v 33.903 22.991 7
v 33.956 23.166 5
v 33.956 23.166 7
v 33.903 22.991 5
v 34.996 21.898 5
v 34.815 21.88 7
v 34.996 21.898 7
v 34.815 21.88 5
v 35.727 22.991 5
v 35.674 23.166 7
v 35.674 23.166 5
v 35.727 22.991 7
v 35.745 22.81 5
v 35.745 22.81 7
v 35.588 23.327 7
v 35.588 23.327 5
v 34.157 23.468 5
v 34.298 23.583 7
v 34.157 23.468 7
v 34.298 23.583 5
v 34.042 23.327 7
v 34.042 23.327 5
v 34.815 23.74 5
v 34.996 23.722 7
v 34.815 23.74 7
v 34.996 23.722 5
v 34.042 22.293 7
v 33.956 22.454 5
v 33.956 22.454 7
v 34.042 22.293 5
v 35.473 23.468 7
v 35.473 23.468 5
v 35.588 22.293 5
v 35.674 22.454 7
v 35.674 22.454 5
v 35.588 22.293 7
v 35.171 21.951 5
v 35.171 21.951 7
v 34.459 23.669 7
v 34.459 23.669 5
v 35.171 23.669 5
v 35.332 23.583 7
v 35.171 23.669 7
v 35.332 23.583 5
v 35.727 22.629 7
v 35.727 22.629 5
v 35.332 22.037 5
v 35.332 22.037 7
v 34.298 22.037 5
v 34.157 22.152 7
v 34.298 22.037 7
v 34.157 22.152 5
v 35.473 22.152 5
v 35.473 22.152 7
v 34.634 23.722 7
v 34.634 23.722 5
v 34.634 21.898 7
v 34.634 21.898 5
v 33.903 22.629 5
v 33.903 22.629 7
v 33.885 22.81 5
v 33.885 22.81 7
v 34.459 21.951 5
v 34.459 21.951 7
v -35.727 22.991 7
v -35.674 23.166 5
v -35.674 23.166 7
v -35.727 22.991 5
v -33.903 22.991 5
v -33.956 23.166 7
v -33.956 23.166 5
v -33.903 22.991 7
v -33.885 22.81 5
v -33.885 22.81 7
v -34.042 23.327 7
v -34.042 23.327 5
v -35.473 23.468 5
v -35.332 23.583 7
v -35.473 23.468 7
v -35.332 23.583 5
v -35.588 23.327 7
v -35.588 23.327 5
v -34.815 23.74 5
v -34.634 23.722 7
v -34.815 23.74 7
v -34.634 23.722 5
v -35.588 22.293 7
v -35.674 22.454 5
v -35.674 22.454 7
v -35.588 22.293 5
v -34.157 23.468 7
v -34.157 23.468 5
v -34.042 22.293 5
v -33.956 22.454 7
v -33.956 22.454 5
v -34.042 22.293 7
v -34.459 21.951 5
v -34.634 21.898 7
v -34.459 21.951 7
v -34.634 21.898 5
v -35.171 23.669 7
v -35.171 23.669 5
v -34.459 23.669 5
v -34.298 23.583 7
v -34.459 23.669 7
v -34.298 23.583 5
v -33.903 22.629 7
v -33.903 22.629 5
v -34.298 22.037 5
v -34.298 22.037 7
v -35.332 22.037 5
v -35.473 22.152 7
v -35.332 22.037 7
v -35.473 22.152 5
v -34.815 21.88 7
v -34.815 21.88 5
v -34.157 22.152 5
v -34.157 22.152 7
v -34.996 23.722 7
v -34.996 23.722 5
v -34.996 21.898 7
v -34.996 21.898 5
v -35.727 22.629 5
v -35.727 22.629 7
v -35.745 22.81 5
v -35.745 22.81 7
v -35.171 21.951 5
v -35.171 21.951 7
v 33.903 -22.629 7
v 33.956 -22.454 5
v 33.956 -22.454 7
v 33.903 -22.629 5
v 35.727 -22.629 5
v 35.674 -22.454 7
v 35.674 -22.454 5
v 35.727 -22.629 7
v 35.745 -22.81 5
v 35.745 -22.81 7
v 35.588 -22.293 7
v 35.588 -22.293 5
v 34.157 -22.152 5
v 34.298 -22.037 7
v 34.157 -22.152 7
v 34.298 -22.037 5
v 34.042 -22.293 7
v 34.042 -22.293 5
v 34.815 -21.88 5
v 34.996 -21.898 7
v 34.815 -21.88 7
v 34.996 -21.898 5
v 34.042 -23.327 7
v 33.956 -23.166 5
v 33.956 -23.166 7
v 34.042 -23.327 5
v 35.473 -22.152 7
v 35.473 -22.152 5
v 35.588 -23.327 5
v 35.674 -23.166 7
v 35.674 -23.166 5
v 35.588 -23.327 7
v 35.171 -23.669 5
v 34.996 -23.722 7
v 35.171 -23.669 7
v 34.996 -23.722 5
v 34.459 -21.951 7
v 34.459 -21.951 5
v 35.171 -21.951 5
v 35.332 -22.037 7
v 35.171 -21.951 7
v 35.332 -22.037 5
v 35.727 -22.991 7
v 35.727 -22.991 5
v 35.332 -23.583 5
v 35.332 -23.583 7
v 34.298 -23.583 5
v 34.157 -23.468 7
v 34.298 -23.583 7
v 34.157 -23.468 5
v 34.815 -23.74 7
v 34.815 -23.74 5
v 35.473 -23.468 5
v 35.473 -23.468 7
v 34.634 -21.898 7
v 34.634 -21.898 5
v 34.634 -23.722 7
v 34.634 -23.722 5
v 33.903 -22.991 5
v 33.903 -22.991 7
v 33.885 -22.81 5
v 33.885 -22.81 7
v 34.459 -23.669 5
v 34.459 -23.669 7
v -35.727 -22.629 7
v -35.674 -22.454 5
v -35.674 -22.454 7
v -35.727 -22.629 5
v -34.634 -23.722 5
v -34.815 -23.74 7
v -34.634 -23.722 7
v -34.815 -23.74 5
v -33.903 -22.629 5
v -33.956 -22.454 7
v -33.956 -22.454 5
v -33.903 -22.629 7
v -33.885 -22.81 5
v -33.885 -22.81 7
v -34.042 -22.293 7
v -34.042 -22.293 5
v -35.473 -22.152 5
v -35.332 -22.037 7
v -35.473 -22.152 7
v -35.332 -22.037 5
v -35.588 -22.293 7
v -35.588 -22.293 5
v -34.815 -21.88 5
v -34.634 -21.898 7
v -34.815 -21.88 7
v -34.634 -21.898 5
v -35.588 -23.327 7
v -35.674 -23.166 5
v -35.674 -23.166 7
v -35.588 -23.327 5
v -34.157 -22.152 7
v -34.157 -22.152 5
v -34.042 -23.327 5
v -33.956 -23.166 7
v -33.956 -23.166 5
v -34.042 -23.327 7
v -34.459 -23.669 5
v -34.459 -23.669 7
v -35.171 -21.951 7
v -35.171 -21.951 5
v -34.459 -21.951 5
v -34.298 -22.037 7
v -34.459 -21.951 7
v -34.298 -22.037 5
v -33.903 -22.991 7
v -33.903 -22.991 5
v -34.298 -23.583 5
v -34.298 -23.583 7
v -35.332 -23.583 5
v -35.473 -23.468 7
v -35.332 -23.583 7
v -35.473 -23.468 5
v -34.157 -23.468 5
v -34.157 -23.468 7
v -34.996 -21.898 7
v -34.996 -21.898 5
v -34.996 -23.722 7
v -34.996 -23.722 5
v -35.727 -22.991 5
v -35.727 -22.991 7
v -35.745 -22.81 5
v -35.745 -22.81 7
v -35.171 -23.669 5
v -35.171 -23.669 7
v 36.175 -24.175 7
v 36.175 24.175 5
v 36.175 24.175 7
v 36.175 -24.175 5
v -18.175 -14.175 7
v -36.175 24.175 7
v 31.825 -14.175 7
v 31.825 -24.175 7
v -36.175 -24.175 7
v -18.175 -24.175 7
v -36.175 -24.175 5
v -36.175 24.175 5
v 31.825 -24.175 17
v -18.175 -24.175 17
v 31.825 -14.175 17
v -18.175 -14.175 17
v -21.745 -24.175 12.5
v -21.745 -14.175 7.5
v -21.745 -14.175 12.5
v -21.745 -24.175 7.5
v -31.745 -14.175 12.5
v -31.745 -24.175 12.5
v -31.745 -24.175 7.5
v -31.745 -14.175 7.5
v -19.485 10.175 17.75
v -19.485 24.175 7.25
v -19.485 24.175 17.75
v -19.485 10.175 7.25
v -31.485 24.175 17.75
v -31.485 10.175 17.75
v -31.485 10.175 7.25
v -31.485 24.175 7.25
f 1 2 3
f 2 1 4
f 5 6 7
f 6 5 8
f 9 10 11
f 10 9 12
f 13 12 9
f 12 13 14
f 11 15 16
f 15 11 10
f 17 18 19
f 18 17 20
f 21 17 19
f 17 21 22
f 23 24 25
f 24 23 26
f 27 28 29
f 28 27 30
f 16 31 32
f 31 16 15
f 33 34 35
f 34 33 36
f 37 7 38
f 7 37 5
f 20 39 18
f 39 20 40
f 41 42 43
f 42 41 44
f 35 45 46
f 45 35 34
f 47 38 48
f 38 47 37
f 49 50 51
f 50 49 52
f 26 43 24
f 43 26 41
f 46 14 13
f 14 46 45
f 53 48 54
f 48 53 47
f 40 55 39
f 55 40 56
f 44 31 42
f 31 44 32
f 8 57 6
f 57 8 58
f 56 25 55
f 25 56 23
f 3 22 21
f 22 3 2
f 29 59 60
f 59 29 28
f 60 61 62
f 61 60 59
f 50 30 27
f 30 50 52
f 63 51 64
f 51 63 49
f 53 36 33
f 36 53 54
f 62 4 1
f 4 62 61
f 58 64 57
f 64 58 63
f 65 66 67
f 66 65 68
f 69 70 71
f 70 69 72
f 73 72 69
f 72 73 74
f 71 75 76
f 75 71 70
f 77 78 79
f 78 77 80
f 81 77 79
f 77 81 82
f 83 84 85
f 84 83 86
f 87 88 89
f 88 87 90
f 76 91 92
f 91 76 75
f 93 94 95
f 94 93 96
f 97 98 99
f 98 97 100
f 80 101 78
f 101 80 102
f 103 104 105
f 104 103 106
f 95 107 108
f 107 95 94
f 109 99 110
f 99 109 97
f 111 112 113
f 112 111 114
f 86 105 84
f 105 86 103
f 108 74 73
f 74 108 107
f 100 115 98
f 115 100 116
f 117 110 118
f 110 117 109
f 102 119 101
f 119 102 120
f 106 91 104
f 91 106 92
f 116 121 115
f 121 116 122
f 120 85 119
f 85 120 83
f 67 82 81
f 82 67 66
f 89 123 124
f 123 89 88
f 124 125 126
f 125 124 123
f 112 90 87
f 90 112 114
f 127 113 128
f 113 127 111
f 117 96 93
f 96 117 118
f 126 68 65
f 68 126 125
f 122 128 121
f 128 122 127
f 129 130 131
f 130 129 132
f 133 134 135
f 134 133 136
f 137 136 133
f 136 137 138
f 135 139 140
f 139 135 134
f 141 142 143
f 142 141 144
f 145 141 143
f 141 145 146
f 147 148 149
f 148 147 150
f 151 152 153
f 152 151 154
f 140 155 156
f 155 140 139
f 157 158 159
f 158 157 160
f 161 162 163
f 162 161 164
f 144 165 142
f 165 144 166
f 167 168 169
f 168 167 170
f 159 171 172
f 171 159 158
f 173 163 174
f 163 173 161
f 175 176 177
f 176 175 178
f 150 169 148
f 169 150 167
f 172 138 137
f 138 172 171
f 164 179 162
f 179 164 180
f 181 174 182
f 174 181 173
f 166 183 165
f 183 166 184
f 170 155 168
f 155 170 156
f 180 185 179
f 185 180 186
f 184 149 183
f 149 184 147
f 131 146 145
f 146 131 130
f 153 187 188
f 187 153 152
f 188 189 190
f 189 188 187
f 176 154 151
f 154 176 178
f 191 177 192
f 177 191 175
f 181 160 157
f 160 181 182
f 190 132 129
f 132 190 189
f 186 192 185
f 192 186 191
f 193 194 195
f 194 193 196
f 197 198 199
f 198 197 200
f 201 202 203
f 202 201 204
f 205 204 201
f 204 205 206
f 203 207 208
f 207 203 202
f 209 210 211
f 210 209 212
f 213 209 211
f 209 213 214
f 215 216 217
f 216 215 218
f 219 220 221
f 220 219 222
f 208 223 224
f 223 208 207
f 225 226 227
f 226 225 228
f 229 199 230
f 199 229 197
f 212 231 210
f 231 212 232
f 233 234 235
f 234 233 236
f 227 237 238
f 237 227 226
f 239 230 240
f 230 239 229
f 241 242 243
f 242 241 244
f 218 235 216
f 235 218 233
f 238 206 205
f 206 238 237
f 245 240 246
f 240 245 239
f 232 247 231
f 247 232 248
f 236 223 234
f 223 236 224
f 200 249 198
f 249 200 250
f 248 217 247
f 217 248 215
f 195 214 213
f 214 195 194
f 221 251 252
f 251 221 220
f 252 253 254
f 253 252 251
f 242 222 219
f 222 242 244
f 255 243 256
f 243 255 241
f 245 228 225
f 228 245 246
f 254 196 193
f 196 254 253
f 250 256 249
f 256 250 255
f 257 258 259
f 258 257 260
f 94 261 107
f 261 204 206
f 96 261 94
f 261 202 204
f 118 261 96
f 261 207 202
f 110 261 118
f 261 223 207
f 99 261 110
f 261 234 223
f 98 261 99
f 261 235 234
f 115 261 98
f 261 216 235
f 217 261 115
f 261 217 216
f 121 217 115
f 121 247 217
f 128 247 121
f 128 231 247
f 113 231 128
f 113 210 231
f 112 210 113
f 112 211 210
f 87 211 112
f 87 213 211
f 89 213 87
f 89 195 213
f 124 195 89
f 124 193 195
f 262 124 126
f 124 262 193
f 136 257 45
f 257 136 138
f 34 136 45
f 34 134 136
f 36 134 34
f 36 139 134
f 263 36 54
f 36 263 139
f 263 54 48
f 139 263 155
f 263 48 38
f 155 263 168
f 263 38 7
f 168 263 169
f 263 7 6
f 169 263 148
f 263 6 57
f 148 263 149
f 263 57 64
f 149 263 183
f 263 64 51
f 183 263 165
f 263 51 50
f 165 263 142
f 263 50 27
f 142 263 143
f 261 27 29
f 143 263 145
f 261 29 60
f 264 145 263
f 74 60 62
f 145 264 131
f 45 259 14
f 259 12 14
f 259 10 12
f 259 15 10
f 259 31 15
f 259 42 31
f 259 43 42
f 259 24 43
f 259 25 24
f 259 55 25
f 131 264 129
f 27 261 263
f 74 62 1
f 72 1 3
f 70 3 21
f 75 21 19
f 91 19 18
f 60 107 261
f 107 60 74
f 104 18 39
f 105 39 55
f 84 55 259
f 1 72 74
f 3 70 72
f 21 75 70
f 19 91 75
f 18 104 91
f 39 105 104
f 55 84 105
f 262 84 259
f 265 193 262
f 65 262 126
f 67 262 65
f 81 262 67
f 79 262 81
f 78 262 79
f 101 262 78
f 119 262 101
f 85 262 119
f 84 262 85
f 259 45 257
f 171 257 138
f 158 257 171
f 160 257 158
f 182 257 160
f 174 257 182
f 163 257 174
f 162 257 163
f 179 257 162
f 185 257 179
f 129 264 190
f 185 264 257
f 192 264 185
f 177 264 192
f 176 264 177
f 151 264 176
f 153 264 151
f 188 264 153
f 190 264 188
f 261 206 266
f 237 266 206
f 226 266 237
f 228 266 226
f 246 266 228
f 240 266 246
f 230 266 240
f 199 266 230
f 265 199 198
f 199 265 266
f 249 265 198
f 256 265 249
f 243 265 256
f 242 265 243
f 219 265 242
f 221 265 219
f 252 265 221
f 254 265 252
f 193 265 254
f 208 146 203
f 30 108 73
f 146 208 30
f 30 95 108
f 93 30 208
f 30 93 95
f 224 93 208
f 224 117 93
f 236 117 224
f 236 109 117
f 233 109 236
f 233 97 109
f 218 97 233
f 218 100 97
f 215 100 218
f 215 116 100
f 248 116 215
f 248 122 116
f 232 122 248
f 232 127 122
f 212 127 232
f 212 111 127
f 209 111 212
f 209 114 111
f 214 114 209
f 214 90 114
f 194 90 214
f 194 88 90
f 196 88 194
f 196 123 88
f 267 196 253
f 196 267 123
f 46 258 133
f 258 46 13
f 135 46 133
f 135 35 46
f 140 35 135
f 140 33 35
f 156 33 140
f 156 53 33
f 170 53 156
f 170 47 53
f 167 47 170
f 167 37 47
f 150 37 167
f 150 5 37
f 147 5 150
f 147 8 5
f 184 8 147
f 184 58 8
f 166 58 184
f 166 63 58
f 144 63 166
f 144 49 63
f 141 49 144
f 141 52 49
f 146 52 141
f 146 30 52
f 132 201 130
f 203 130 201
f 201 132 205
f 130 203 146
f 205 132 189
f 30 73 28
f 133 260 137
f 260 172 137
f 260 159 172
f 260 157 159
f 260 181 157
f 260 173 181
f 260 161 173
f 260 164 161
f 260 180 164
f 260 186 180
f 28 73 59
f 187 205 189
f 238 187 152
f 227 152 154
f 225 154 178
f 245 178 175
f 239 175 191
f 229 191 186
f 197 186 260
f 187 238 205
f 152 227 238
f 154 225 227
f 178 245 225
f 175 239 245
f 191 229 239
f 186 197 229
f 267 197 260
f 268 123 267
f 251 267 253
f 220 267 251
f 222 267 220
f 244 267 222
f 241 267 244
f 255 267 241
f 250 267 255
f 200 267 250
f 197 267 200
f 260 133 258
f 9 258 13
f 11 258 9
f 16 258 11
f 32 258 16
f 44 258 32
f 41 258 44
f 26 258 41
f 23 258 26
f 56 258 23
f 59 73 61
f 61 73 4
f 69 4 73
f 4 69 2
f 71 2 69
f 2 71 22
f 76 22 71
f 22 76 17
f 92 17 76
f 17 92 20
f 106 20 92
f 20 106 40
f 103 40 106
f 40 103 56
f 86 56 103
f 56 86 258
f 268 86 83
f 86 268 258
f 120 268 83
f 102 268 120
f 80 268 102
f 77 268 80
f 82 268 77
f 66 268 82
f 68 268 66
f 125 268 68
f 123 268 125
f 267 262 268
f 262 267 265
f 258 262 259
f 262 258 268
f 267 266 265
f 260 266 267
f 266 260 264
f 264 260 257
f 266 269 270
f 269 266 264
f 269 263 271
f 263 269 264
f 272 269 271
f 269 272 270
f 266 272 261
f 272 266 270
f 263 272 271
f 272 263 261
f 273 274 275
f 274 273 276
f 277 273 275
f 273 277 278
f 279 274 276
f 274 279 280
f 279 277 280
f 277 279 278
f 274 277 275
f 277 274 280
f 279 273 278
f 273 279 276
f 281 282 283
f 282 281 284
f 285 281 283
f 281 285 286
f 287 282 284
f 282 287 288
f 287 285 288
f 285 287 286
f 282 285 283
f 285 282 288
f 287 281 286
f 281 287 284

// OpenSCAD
$fn = 32;

module gw_pos() {
    translate([-14.4, 190, 0]) children();
}

module gw_holes() {
    /*
    for (y = [-1, 1]) {
        for (x = [-1, 1]) {
            translate([x*34.5, y*16.2]) children();
        }
    }
    */
    
    x = (72.43-(.8+2))/2;
    y = (48.42-(.8+2))/2;
    
    translate([x, y]) children();
    translate([-x, y]) children();
    translate([x, -y]) children();
    translate([-x, -y]) children();
}

module gw() {
    translate([0, 0, 6]) {
        color("darkgreen") difference() {
            cube([72.35, 48.35, 2], center=true);
            gw_holes() cylinder(d=1.86, h=10, center=true);
        }
        color("black") translate([6.825, -19.175, 6]) cube([50, 10, 10], center=true);
        color("white") translate([-26.745, -19.175, 4]) cube([10, 10, 5], center=true);
        color("grey") translate([-25.485, 17.175, 6.5]) cube([12, 14, 10.5], center=true);
    }
}


gw();
